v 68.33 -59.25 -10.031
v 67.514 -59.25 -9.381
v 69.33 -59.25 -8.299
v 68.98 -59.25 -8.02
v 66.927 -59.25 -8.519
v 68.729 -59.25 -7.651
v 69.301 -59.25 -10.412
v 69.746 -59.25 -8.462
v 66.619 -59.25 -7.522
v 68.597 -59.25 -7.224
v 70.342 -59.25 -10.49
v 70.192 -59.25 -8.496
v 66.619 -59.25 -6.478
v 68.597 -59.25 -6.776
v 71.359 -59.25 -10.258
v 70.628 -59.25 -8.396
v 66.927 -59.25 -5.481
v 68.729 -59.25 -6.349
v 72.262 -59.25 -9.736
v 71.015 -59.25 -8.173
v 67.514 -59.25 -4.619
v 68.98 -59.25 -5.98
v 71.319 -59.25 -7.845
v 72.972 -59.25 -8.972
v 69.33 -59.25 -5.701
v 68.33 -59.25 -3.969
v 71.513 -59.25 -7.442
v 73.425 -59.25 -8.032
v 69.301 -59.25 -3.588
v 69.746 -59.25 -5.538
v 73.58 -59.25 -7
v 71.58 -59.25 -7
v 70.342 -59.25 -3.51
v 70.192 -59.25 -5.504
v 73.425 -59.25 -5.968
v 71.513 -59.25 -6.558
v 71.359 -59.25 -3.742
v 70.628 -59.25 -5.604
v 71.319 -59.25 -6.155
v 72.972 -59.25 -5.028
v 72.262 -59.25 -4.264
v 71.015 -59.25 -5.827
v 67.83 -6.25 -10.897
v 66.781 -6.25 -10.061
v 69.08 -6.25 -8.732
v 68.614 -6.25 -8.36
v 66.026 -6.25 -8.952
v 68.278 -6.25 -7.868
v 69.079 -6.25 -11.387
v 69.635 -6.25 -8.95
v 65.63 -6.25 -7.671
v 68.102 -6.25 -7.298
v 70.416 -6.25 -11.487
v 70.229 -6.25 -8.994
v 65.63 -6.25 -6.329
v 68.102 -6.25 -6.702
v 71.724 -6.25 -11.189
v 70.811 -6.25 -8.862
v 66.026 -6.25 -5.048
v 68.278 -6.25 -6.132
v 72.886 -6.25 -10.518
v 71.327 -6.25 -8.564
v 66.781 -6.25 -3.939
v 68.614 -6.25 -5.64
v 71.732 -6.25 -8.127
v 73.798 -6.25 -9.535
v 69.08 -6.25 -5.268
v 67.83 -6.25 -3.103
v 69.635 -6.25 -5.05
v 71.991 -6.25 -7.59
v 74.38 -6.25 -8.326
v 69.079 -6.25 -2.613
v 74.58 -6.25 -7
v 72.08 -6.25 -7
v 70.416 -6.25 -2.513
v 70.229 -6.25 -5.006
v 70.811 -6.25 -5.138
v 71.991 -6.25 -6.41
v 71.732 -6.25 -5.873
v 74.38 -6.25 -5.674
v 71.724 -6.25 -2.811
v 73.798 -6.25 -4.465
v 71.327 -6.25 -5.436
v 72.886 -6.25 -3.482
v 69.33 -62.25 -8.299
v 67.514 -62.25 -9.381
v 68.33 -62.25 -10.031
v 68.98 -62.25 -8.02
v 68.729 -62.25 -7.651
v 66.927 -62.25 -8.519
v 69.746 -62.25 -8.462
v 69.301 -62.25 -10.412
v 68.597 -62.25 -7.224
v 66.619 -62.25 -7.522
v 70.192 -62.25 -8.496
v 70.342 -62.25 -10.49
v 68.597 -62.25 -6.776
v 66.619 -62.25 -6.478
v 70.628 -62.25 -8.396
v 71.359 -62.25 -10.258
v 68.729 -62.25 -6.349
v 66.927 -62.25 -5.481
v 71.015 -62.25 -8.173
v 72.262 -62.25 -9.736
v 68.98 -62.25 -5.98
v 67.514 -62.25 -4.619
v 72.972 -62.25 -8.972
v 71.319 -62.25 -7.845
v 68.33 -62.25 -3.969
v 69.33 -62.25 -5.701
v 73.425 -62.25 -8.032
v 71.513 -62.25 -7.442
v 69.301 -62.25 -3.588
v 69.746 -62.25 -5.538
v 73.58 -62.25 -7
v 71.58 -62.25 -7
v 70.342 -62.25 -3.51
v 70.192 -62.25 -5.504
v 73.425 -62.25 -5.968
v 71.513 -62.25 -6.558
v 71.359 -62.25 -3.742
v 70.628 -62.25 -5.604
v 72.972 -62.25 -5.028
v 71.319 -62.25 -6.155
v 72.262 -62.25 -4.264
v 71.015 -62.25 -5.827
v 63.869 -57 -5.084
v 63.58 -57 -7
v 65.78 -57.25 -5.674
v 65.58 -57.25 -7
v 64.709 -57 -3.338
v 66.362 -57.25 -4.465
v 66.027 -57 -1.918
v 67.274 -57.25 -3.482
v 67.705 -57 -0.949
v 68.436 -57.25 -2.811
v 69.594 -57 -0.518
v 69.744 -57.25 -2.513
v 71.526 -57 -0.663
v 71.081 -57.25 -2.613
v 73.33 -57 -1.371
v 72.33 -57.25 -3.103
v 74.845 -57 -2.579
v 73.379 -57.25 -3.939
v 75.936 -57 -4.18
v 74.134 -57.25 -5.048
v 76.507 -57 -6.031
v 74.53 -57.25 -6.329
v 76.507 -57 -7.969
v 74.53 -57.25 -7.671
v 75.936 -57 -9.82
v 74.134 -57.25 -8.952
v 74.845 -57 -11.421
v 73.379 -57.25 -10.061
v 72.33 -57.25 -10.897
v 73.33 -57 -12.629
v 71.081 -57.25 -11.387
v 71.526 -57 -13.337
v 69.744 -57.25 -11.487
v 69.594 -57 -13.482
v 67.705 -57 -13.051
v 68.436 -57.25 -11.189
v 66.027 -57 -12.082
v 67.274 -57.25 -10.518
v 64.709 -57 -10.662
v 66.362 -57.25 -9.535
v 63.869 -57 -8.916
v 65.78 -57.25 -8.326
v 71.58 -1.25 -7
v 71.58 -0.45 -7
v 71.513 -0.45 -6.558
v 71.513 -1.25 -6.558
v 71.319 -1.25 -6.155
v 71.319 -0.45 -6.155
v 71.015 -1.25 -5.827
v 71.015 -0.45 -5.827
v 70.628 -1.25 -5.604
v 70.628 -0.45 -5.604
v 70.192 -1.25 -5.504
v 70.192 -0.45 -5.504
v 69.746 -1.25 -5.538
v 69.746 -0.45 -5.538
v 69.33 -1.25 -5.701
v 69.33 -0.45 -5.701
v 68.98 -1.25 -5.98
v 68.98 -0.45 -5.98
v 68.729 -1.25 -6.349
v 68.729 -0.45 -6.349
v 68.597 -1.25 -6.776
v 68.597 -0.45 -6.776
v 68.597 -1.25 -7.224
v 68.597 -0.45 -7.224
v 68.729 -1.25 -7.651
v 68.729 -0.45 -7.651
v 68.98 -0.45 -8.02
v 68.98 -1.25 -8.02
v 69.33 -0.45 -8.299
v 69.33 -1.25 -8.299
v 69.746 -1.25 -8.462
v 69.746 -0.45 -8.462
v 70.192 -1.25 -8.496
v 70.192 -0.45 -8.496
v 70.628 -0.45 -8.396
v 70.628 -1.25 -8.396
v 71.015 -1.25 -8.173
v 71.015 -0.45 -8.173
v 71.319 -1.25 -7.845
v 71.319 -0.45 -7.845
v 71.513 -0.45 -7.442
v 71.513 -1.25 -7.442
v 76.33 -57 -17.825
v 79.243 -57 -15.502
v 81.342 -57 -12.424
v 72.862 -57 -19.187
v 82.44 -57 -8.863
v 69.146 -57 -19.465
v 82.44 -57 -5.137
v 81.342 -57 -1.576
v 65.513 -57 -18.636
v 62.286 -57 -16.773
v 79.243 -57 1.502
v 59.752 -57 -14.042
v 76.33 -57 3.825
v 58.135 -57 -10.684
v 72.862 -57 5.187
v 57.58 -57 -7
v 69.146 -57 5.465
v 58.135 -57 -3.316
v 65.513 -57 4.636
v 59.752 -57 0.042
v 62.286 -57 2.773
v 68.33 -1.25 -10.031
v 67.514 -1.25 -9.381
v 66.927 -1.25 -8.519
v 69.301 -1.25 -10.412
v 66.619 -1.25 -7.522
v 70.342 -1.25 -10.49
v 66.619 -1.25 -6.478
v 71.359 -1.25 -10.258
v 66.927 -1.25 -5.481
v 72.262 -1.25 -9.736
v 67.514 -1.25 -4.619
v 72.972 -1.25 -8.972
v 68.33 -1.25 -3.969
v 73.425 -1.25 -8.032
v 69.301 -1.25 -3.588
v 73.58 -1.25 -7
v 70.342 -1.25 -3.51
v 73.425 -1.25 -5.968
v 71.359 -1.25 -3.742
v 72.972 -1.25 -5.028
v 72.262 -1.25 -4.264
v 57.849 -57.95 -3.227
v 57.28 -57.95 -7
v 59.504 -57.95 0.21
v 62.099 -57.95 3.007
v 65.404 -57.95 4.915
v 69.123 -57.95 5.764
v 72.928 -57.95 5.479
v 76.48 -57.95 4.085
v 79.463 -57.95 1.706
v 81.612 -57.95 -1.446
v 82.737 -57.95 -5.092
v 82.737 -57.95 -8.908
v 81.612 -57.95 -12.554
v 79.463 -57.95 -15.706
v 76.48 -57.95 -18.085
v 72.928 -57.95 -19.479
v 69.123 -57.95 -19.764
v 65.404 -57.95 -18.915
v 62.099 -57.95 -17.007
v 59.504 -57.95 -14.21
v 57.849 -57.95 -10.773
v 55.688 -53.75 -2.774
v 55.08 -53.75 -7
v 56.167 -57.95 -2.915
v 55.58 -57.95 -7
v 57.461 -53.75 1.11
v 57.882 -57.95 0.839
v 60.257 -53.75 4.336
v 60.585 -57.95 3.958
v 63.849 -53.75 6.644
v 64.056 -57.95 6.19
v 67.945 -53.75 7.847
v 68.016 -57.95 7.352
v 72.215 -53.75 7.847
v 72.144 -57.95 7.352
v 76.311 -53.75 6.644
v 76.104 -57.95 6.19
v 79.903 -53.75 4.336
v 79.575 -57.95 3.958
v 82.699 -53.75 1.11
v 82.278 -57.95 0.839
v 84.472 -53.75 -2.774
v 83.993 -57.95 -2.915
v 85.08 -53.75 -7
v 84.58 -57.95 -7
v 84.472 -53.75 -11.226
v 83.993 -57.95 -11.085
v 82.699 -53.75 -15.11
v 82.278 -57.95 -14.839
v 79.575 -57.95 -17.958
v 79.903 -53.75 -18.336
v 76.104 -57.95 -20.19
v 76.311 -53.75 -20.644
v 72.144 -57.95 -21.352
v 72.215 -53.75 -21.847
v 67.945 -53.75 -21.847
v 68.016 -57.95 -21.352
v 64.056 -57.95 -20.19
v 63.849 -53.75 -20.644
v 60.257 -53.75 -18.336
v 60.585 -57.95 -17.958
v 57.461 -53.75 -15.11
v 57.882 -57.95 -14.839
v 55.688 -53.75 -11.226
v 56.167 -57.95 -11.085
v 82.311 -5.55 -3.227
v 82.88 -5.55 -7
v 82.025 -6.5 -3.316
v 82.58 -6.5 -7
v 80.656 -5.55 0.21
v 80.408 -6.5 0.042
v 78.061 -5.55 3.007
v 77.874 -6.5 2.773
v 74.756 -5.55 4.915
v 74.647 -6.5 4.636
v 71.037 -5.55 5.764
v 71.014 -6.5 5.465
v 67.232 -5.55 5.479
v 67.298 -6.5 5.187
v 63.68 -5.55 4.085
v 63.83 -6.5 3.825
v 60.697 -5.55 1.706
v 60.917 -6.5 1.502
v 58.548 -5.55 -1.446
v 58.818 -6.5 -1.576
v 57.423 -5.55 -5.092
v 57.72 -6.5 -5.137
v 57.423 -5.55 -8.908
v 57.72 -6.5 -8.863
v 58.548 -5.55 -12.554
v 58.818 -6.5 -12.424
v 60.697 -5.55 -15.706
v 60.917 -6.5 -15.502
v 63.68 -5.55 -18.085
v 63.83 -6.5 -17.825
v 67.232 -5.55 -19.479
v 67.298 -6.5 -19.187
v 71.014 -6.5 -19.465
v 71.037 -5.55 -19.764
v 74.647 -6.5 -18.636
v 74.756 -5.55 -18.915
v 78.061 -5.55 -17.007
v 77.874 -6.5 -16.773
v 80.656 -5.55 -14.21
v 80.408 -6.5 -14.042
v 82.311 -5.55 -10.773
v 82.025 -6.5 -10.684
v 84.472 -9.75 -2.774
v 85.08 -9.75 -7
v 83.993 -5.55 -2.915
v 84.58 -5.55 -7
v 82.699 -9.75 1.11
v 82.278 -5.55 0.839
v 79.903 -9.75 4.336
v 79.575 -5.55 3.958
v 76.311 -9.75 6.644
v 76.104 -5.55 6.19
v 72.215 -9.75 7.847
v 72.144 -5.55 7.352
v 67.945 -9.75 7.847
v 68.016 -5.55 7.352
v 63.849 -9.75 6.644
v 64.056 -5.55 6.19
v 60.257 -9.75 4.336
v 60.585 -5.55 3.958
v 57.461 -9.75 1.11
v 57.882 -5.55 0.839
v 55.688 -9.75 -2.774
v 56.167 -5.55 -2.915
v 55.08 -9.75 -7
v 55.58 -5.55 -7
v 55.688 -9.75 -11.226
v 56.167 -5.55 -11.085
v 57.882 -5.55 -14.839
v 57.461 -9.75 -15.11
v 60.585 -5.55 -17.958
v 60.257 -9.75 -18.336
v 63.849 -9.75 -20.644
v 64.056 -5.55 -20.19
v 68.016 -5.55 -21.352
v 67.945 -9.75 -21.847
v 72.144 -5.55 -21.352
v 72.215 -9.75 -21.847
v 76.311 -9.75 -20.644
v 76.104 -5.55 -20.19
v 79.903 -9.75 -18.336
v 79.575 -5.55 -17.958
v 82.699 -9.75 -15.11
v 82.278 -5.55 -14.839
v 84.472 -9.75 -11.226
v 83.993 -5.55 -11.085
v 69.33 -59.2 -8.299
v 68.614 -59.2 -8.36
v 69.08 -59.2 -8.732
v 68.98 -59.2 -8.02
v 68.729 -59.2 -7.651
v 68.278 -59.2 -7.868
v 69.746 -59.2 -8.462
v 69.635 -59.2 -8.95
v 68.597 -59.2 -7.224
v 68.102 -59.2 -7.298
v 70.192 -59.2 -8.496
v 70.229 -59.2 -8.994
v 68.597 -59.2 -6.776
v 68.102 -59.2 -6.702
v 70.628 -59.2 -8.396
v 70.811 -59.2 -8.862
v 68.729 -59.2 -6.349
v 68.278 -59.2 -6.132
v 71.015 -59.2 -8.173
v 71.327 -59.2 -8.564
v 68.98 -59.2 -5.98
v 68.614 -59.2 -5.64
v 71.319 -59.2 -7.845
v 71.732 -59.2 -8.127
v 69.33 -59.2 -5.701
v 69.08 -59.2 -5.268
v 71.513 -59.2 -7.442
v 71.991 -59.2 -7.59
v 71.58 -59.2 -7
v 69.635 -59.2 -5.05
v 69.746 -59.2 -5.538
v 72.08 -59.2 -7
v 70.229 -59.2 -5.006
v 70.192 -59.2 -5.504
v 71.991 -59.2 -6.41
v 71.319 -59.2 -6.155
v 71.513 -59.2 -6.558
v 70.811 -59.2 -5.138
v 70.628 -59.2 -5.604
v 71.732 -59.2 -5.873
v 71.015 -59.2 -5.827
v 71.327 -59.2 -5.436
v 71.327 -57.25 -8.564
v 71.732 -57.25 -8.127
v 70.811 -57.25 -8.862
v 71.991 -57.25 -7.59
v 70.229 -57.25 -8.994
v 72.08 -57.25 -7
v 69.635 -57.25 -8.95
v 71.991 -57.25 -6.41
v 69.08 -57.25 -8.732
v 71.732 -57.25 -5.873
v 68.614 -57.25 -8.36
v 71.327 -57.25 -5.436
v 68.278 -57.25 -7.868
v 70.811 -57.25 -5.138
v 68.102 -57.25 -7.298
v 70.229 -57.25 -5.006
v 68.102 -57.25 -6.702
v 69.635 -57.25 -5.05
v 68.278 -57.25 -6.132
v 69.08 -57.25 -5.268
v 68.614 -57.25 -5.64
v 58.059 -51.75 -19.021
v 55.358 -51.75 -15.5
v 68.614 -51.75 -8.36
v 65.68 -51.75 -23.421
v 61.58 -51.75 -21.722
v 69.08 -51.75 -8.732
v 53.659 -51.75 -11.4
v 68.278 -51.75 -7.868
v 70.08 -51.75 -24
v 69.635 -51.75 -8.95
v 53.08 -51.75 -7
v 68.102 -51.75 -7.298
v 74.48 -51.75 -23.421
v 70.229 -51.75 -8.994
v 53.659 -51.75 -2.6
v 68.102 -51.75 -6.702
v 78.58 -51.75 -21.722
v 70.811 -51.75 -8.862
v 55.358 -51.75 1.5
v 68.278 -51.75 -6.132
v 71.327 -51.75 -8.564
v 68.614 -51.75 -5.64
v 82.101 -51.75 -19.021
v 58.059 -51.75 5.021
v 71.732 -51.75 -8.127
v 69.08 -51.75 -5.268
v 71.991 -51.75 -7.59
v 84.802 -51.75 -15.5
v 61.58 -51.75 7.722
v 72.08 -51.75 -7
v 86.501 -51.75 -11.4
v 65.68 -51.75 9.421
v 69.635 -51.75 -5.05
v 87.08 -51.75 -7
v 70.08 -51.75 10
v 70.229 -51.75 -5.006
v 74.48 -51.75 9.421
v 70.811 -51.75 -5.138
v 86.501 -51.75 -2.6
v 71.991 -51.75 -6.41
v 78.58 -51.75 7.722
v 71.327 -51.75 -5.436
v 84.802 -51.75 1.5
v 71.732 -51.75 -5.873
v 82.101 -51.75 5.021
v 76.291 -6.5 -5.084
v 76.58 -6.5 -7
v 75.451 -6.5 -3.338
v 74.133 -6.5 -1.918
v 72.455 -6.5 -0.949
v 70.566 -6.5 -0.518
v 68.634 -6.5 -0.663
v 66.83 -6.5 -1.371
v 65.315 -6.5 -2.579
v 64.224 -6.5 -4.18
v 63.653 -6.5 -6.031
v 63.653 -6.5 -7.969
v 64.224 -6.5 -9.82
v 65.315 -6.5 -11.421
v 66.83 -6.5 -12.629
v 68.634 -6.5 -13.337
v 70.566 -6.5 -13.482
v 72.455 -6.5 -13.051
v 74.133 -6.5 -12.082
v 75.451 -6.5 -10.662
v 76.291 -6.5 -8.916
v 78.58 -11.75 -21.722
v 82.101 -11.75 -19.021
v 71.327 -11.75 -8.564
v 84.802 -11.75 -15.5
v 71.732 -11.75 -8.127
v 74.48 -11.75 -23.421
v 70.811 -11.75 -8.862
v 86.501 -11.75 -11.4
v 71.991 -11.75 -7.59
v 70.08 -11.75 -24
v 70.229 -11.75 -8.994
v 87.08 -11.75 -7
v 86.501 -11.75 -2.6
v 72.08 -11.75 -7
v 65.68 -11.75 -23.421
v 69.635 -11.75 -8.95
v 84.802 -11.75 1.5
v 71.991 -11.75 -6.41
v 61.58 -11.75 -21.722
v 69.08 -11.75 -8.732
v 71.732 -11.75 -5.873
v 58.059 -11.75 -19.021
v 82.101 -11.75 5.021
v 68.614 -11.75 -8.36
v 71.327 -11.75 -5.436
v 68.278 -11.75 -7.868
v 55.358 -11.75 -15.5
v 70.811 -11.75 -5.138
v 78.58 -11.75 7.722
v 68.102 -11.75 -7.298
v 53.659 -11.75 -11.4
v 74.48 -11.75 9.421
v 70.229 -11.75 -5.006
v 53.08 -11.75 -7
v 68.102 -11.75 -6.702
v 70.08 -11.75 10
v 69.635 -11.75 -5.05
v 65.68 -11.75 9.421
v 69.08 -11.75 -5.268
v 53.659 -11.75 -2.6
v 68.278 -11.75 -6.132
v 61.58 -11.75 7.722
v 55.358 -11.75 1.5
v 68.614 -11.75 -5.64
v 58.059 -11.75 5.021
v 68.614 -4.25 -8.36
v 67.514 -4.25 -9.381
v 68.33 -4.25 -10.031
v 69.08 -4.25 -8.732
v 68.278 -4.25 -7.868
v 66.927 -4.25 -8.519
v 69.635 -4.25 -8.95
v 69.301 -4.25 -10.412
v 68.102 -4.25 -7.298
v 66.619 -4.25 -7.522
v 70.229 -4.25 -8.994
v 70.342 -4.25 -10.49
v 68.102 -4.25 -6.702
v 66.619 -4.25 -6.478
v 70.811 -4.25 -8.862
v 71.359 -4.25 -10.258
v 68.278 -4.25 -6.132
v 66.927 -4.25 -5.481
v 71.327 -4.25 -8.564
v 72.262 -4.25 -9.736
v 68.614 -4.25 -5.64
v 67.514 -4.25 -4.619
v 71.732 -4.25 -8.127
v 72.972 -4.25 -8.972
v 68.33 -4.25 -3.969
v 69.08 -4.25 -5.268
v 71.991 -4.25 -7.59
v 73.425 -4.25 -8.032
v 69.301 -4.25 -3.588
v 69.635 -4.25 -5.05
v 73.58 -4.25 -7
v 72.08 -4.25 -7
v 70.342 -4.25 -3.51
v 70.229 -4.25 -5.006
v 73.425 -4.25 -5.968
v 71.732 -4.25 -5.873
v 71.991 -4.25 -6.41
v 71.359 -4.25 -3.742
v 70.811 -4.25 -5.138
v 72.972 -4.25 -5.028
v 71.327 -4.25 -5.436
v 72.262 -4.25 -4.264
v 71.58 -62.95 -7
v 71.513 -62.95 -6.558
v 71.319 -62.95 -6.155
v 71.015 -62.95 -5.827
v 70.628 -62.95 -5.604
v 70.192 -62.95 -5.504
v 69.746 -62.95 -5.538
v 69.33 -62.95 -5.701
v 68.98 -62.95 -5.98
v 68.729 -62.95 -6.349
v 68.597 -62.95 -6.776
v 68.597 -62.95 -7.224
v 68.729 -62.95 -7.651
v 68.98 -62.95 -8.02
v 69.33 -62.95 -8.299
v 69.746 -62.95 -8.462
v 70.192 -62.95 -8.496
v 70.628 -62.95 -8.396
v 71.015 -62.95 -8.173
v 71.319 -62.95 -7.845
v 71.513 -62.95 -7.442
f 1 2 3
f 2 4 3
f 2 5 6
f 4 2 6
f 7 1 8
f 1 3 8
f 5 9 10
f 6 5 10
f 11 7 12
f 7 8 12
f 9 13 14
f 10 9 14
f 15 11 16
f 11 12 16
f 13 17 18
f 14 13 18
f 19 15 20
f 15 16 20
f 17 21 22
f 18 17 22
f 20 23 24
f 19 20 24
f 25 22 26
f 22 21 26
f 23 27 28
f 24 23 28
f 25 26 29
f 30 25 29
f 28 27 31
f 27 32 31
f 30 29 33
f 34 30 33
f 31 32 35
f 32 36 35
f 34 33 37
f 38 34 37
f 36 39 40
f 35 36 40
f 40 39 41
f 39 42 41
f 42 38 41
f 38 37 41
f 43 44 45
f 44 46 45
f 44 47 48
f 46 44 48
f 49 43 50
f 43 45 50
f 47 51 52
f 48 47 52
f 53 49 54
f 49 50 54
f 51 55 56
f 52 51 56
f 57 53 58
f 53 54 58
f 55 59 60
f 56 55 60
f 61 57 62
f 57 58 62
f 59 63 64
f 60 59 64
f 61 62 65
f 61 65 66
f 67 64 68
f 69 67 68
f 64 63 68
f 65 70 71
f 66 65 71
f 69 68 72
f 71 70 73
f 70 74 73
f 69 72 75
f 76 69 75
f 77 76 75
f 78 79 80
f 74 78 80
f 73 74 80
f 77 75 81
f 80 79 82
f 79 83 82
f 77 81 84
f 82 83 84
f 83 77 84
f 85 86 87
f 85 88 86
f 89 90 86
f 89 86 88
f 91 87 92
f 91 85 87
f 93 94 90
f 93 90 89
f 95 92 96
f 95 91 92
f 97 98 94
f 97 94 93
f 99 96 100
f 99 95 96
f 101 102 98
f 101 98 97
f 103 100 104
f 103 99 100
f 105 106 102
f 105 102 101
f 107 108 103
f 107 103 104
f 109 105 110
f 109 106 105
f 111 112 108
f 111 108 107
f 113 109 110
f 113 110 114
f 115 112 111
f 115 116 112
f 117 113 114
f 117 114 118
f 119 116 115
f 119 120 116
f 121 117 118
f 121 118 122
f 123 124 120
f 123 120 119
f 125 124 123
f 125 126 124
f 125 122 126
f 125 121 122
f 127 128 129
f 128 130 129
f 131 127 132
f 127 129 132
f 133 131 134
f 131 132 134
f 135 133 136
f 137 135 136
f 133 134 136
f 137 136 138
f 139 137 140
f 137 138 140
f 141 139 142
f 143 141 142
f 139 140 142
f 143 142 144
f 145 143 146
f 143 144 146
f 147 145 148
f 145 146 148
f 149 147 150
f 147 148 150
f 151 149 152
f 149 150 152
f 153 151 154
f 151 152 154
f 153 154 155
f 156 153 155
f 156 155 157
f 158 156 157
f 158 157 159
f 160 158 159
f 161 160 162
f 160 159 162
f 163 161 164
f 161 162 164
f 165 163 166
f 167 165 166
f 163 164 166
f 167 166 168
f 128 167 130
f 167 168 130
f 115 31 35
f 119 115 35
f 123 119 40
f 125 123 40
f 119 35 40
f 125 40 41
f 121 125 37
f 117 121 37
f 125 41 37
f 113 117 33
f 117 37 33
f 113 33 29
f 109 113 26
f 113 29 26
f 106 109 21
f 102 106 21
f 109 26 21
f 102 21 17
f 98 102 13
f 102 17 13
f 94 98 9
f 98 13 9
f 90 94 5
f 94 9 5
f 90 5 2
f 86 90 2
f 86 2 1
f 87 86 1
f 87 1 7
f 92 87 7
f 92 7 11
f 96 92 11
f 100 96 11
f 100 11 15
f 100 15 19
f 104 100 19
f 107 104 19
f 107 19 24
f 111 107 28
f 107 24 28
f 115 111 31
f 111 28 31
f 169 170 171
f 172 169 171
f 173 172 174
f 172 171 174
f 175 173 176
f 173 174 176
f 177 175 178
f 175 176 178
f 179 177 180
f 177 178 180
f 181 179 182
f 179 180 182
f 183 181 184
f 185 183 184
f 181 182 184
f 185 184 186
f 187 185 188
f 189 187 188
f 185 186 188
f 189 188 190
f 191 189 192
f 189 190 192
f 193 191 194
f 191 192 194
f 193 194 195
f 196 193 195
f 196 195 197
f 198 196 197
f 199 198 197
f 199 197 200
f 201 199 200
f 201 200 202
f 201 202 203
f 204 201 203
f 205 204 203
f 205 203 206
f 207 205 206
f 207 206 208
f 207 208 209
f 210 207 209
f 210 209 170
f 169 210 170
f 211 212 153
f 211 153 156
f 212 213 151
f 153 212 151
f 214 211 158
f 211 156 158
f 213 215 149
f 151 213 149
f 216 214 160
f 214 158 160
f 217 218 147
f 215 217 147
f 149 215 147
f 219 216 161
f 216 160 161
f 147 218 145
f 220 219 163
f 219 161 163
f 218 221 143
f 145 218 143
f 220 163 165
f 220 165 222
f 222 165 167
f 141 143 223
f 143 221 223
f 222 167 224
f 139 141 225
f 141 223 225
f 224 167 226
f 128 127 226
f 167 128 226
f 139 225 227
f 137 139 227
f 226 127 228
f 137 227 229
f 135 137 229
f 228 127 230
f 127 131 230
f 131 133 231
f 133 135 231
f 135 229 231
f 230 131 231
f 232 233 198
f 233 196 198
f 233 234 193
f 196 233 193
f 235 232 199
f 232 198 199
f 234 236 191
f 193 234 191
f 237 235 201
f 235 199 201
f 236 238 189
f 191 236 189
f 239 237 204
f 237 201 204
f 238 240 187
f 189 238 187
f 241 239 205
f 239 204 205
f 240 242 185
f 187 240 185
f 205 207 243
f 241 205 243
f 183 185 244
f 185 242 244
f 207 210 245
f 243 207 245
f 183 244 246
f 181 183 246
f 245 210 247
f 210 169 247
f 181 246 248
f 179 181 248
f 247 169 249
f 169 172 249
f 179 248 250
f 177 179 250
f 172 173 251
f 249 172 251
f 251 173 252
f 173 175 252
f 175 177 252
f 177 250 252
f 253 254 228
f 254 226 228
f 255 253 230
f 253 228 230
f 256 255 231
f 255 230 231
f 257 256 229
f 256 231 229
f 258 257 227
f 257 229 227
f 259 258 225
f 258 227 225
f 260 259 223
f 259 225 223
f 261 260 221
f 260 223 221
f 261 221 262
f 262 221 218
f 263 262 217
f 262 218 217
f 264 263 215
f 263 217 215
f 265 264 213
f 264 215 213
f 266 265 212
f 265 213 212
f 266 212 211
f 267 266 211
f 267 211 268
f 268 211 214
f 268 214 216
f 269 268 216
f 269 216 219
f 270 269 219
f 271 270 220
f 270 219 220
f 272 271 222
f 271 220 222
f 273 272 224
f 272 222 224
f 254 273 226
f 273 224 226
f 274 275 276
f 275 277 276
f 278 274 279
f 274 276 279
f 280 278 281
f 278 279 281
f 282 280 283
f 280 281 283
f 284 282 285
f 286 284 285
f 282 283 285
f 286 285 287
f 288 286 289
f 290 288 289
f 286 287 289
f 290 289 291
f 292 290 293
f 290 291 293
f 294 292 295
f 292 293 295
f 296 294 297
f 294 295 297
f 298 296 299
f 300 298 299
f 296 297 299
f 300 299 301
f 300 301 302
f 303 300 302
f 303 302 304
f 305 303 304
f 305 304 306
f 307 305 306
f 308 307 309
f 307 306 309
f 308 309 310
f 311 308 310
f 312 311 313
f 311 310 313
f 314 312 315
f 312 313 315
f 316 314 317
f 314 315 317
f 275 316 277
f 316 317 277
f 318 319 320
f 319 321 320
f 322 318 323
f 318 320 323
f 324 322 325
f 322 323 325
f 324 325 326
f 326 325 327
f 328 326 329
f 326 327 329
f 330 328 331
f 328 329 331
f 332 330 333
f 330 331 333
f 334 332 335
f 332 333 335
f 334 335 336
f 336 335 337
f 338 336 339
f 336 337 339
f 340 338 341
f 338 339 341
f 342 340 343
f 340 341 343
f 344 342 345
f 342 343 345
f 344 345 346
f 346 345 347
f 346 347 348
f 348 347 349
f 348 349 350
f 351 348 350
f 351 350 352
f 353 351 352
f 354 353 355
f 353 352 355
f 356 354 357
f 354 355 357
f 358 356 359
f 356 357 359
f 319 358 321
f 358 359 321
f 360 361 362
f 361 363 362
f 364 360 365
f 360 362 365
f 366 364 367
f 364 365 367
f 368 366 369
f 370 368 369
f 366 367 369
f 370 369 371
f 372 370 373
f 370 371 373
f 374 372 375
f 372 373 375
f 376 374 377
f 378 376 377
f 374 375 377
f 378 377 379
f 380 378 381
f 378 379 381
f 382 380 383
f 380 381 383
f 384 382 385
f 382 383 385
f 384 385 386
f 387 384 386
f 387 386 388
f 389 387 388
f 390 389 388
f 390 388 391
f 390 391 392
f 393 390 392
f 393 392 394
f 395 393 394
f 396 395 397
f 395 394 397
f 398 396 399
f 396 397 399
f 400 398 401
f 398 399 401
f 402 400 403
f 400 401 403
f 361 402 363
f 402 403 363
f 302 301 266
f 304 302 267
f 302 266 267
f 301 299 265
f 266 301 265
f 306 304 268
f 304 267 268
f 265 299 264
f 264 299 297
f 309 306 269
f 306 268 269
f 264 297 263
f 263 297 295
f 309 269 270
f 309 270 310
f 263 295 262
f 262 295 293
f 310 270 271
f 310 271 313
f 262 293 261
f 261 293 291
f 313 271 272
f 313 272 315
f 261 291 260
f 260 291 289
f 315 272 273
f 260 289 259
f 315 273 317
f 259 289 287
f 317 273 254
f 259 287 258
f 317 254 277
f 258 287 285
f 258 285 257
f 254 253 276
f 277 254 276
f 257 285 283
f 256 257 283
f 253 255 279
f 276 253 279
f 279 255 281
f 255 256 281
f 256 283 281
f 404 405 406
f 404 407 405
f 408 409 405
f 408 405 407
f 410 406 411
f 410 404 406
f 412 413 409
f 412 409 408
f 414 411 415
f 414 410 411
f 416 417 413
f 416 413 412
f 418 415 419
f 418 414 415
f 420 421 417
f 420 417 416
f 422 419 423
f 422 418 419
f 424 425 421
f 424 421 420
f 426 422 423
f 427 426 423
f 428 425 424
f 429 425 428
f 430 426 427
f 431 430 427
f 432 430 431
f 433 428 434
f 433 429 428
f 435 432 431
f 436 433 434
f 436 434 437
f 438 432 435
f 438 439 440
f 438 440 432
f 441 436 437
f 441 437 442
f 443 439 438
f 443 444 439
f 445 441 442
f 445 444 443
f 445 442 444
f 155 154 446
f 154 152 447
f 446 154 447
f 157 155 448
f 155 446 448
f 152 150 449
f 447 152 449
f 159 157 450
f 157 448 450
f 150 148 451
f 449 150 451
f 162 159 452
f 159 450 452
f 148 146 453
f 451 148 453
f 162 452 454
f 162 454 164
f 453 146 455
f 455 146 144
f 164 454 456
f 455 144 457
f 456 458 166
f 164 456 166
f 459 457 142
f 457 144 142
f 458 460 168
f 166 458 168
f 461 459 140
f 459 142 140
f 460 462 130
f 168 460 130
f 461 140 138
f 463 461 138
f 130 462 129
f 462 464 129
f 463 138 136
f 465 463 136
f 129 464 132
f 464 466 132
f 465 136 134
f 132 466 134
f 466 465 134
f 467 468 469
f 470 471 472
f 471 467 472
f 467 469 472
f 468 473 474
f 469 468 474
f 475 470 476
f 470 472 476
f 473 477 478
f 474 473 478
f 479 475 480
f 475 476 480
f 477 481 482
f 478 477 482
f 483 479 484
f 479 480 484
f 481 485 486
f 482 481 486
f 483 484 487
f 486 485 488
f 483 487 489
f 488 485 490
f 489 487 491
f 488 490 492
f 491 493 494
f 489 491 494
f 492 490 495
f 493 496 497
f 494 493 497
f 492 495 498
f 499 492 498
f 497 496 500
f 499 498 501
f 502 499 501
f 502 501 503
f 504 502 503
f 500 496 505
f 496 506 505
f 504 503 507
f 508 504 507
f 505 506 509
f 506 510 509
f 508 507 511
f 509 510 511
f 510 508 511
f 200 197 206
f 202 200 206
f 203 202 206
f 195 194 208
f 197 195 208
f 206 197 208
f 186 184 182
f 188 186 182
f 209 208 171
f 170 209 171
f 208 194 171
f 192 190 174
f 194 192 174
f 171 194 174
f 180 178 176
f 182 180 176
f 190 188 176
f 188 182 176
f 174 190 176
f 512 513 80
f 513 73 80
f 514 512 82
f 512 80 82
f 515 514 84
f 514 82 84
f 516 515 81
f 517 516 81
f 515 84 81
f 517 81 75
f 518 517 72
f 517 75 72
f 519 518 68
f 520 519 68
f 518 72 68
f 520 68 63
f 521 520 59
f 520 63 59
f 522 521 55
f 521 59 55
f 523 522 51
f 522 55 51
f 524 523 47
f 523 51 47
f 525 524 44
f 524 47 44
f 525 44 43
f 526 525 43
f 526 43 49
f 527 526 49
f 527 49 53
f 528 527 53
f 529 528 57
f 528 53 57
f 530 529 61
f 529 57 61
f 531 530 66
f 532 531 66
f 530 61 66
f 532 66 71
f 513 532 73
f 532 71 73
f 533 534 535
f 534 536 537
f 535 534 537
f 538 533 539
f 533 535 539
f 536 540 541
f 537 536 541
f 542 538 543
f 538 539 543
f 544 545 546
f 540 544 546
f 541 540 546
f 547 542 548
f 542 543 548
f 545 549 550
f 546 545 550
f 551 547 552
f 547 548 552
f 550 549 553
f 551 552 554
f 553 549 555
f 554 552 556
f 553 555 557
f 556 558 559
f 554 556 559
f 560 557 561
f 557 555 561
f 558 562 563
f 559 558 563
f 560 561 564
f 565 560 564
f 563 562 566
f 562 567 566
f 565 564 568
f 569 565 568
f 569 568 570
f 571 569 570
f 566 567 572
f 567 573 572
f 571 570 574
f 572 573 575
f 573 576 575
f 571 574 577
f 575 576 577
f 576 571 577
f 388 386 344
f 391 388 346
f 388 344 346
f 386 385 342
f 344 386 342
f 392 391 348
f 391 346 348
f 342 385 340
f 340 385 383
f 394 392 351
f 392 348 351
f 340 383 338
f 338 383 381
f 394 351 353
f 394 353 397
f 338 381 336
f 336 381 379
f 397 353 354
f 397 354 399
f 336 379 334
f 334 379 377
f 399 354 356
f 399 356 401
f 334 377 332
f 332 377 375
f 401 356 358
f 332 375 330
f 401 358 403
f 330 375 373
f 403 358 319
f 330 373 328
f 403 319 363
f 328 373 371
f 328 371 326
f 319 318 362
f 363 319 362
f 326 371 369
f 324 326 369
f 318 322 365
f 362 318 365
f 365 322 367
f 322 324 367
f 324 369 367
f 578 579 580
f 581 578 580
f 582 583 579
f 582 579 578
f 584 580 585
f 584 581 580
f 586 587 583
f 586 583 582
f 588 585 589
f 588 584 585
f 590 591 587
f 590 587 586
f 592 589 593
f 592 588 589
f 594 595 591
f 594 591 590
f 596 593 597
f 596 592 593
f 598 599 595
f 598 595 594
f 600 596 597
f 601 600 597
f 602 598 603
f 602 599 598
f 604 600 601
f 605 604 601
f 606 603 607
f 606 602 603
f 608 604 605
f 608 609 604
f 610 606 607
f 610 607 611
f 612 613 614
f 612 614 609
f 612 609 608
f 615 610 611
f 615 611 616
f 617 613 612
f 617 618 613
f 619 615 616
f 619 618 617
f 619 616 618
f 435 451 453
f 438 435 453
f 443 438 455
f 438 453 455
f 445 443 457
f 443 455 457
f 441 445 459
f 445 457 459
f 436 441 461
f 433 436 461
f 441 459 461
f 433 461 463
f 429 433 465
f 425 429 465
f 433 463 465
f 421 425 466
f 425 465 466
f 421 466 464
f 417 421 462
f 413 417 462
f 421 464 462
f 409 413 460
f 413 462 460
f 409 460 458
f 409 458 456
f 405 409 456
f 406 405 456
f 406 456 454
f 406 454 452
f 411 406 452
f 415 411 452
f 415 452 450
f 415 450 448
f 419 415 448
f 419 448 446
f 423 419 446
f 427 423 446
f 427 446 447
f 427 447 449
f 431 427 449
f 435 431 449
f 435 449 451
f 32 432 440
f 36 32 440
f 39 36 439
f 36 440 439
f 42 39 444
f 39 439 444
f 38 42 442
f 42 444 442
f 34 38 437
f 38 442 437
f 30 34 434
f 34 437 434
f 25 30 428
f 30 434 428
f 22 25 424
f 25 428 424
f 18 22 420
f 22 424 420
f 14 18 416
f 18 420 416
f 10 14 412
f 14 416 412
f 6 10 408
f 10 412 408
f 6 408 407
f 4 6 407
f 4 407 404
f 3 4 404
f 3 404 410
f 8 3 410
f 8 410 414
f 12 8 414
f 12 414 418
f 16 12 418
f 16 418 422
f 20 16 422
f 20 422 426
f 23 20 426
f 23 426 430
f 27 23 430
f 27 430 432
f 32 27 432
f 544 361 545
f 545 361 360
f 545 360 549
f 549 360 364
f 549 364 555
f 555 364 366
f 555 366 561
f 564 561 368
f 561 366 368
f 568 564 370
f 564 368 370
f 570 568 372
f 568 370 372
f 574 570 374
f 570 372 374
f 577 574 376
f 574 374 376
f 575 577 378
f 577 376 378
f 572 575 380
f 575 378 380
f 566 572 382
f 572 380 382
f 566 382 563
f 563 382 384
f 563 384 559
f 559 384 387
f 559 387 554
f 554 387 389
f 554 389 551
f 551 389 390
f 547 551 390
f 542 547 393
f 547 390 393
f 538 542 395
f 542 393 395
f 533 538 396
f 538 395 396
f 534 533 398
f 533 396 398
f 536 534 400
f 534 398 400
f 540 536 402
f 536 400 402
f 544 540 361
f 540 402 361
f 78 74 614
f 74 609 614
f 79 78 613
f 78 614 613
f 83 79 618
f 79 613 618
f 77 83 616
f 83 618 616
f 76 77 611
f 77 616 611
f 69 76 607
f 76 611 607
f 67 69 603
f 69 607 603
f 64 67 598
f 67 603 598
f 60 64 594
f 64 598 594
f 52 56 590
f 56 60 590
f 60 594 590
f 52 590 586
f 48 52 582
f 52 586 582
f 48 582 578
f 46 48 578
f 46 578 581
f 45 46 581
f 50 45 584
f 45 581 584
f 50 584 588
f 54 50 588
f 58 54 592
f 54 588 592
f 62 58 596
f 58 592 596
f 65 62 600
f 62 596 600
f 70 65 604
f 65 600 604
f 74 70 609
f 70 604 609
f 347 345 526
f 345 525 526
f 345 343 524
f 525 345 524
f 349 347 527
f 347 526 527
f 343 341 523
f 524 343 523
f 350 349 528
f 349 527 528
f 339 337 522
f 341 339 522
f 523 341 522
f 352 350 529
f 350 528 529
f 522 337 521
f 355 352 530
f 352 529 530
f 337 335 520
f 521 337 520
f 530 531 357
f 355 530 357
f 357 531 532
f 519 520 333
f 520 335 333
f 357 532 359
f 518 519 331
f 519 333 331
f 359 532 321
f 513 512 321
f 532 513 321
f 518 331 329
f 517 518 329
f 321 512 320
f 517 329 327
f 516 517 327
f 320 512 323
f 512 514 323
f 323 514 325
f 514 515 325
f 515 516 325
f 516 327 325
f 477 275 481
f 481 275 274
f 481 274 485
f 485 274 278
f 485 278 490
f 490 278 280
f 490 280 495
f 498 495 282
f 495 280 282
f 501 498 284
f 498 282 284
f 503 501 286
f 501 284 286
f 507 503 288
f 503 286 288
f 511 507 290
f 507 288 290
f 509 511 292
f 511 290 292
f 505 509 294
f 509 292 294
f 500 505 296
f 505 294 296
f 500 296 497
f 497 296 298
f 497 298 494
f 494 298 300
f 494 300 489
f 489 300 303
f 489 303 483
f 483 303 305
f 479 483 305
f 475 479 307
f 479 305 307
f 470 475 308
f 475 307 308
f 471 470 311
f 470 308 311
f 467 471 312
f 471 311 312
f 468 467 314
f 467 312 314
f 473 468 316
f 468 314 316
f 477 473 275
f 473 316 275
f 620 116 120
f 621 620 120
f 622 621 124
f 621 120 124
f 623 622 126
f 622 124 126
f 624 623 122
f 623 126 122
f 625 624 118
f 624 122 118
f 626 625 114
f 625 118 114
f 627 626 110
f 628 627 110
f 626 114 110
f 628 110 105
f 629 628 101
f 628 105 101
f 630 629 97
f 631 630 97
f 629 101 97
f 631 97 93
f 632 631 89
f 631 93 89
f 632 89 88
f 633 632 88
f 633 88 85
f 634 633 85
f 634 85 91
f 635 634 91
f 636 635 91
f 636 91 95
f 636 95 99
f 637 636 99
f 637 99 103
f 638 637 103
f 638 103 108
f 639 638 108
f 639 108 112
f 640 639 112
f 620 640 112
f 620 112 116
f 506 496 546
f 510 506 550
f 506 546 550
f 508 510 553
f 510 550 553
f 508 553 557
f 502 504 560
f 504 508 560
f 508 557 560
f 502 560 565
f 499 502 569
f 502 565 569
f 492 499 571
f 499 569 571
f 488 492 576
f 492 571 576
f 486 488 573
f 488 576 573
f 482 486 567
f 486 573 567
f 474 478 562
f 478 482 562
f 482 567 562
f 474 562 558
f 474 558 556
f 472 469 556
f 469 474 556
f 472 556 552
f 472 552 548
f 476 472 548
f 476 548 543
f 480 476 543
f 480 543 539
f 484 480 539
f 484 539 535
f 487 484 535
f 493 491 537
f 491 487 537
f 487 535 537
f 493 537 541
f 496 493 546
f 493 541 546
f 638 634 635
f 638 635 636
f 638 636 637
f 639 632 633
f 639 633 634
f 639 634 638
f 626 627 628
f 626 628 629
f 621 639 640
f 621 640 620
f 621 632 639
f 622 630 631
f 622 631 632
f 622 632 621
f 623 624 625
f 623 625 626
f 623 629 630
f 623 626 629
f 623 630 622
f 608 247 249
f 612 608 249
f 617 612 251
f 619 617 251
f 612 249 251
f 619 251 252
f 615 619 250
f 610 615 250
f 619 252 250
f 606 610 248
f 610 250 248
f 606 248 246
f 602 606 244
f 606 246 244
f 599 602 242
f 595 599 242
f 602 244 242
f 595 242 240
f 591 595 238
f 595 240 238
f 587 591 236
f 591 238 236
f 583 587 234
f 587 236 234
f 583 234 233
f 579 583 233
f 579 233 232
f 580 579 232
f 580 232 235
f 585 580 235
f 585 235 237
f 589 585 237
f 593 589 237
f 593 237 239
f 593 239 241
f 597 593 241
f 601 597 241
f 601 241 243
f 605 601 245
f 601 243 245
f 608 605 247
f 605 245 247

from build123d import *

# Parameters (mm, degrees)
CYLINDER032_R             = 2
CYLINDER032_DEPTH         = 10
CUT021_PLACEMENT_ANGLE    = 180
CYLINDER034_R             = 1.5
CYLINDER034_DEPTH         = 3
CYLINDER033_R             = 3.5
CYLINDER033_DEPTH         = 3
CUT022_PLACEMENT_ANGLE    = 90
CYLINDER030_R             = 1.5
CYLINDER030_DEPTH         = 3
CYLINDER029_R             = 3.5
CYLINDER029_DEPTH         = 3
CUT019_PLACEMENT_ANGLE    = 90
CYLINDER036_R             = 1.5
CYLINDER036_DEPTH         = 62.5
CYLINDER035_R             = 2
CYLINDER035_DEPTH         = 55
FUSION012_PLACEMENT_ANGLE = 90
CYLINDER031_R             = 2
CYLINDER031_DEPTH         = 10


with BuildPart() as cylinder032:
    # Cylinder032 → Cylinder032 (new body)
    with BuildSketch(Plane.XZ.offset(-8)):
        Circle(CYLINDER032_R)
    extrude(amount=CYLINDER032_DEPTH)


with BuildPart() as rad004:
    # Sketch005 → Revolve004 (revolve)
    with BuildSketch(Plane.XY):
        Polygon((0, 0), (17, 0), (15, 2), (14.5, 6.2), (12.8, 6.2), (12.5, 5.25), (6.5, 5.25), (4.5, 5.5), (0, 5.5), align=None)
    revolve(axis=Axis((0, 0, 0), (0, -1, 0)))

    # Cut021: cut Cylinder032
    add(cylinder032.part, mode=Mode.SUBTRACT)


with BuildPart() as rad004_1:
    # Cut021 placement: moved
    add(rad004.part.moved(Location((0, -40, 0))).rotate(Axis((0, -40, 0), (0, 0, 1)), CUT021_PLACEMENT_ANGLE))


with BuildPart() as cylinder034:
    # Cylinder034 → Cylinder034 (new body)
    with BuildSketch(Plane.XY):
        Circle(CYLINDER034_R)
    extrude(amount=CYLINDER034_DEPTH)


with BuildPart() as kugellager004:
    # Cylinder033 → Cylinder033 (new body)
    with BuildSketch(Plane.XY):
        Circle(CYLINDER033_R)
    extrude(amount=CYLINDER033_DEPTH)

    # Cut022: cut Cylinder034
    add(cylinder034.part, mode=Mode.SUBTRACT)


with BuildPart() as kugellager004_1:
    # Cut022 placement: moved
    add(kugellager004.part.moved(Location((0, -47.5, 0))).rotate(Axis((0, -47.5, 0), (1, 0, 0)), CUT022_PLACEMENT_ANGLE))


with BuildPart() as cylinder030:
    # Cylinder030 → Cylinder030 (new body)
    with BuildSketch(Plane.XY):
        Circle(CYLINDER030_R)
    extrude(amount=CYLINDER030_DEPTH)


with BuildPart() as kugellager003:
    # Cylinder029 → Cylinder029 (new body)
    with BuildSketch(Plane.XY):
        Circle(CYLINDER029_R)
    extrude(amount=CYLINDER029_DEPTH)

    # Cut019: cut Cylinder030
    add(cylinder030.part, mode=Mode.SUBTRACT)


with BuildPart() as kugellager003_1:
    # Cut019 placement: moved
    add(kugellager003.part.moved(Location((0, 10.5, 0))).rotate(Axis((0, 10.5, 0), (1, 0, 0)), CUT019_PLACEMENT_ANGLE))


with BuildPart() as cylinder036:
    # Cylinder036 → Cylinder036 (new body)
    with BuildSketch(Plane.XY):
        Circle(CYLINDER036_R)
    extrude(amount=CYLINDER036_DEPTH)


with BuildPart() as achse003:
    # Cylinder035 → Cylinder035 (new body)
    with BuildSketch(Plane.XY.offset(3.75)):
        Circle(CYLINDER035_R)
    extrude(amount=CYLINDER035_DEPTH)

    # Fusion012: union Cylinder036
    add(cylinder036.part)


with BuildPart() as achse003_1:
    # Fusion012 placement: moved
    add(achse003.part.moved(Location((0, 11.3, 0))).rotate(Axis((0, 11.3, 0), (1, 0, 0)), FUSION012_PLACEMENT_ANGLE))


with BuildPart() as cylinder031:
    # Cylinder031 → Cylinder031 (new body)
    with BuildSketch(Plane.XZ.offset(-8)):
        Circle(CYLINDER031_R)
    extrude(amount=CYLINDER031_DEPTH)


with BuildPart() as radsatz002:
    # Sketch005 → Revolve003 (revolve)
    with BuildSketch(Plane.XY):
        Polygon((0, 0), (17, 0), (15, 2), (14.5, 6.2), (12.8, 6.2), (12.5, 5.25), (6.5, 5.25), (4.5, 5.5), (0, 5.5), align=None)
    revolve(axis=Axis((0, 0, 0), (0, -1, 0)))

    # Cut020: cut Cylinder031
    add(cylinder031.part, mode=Mode.SUBTRACT)

    # Fusion013: union Rad004, Kugellager004, Kugellager003, Achse003
    add(rad004_1.part)
    add(kugellager004_1.part)
    add(kugellager003_1.part)
    add(achse003_1.part)


with BuildPart() as radsatz002_1:
    # Fusion013 placement: moved
    add(radsatz002.part.moved(Location((70.08, -11.75, -7))))


solid = radsatz002_1.part
